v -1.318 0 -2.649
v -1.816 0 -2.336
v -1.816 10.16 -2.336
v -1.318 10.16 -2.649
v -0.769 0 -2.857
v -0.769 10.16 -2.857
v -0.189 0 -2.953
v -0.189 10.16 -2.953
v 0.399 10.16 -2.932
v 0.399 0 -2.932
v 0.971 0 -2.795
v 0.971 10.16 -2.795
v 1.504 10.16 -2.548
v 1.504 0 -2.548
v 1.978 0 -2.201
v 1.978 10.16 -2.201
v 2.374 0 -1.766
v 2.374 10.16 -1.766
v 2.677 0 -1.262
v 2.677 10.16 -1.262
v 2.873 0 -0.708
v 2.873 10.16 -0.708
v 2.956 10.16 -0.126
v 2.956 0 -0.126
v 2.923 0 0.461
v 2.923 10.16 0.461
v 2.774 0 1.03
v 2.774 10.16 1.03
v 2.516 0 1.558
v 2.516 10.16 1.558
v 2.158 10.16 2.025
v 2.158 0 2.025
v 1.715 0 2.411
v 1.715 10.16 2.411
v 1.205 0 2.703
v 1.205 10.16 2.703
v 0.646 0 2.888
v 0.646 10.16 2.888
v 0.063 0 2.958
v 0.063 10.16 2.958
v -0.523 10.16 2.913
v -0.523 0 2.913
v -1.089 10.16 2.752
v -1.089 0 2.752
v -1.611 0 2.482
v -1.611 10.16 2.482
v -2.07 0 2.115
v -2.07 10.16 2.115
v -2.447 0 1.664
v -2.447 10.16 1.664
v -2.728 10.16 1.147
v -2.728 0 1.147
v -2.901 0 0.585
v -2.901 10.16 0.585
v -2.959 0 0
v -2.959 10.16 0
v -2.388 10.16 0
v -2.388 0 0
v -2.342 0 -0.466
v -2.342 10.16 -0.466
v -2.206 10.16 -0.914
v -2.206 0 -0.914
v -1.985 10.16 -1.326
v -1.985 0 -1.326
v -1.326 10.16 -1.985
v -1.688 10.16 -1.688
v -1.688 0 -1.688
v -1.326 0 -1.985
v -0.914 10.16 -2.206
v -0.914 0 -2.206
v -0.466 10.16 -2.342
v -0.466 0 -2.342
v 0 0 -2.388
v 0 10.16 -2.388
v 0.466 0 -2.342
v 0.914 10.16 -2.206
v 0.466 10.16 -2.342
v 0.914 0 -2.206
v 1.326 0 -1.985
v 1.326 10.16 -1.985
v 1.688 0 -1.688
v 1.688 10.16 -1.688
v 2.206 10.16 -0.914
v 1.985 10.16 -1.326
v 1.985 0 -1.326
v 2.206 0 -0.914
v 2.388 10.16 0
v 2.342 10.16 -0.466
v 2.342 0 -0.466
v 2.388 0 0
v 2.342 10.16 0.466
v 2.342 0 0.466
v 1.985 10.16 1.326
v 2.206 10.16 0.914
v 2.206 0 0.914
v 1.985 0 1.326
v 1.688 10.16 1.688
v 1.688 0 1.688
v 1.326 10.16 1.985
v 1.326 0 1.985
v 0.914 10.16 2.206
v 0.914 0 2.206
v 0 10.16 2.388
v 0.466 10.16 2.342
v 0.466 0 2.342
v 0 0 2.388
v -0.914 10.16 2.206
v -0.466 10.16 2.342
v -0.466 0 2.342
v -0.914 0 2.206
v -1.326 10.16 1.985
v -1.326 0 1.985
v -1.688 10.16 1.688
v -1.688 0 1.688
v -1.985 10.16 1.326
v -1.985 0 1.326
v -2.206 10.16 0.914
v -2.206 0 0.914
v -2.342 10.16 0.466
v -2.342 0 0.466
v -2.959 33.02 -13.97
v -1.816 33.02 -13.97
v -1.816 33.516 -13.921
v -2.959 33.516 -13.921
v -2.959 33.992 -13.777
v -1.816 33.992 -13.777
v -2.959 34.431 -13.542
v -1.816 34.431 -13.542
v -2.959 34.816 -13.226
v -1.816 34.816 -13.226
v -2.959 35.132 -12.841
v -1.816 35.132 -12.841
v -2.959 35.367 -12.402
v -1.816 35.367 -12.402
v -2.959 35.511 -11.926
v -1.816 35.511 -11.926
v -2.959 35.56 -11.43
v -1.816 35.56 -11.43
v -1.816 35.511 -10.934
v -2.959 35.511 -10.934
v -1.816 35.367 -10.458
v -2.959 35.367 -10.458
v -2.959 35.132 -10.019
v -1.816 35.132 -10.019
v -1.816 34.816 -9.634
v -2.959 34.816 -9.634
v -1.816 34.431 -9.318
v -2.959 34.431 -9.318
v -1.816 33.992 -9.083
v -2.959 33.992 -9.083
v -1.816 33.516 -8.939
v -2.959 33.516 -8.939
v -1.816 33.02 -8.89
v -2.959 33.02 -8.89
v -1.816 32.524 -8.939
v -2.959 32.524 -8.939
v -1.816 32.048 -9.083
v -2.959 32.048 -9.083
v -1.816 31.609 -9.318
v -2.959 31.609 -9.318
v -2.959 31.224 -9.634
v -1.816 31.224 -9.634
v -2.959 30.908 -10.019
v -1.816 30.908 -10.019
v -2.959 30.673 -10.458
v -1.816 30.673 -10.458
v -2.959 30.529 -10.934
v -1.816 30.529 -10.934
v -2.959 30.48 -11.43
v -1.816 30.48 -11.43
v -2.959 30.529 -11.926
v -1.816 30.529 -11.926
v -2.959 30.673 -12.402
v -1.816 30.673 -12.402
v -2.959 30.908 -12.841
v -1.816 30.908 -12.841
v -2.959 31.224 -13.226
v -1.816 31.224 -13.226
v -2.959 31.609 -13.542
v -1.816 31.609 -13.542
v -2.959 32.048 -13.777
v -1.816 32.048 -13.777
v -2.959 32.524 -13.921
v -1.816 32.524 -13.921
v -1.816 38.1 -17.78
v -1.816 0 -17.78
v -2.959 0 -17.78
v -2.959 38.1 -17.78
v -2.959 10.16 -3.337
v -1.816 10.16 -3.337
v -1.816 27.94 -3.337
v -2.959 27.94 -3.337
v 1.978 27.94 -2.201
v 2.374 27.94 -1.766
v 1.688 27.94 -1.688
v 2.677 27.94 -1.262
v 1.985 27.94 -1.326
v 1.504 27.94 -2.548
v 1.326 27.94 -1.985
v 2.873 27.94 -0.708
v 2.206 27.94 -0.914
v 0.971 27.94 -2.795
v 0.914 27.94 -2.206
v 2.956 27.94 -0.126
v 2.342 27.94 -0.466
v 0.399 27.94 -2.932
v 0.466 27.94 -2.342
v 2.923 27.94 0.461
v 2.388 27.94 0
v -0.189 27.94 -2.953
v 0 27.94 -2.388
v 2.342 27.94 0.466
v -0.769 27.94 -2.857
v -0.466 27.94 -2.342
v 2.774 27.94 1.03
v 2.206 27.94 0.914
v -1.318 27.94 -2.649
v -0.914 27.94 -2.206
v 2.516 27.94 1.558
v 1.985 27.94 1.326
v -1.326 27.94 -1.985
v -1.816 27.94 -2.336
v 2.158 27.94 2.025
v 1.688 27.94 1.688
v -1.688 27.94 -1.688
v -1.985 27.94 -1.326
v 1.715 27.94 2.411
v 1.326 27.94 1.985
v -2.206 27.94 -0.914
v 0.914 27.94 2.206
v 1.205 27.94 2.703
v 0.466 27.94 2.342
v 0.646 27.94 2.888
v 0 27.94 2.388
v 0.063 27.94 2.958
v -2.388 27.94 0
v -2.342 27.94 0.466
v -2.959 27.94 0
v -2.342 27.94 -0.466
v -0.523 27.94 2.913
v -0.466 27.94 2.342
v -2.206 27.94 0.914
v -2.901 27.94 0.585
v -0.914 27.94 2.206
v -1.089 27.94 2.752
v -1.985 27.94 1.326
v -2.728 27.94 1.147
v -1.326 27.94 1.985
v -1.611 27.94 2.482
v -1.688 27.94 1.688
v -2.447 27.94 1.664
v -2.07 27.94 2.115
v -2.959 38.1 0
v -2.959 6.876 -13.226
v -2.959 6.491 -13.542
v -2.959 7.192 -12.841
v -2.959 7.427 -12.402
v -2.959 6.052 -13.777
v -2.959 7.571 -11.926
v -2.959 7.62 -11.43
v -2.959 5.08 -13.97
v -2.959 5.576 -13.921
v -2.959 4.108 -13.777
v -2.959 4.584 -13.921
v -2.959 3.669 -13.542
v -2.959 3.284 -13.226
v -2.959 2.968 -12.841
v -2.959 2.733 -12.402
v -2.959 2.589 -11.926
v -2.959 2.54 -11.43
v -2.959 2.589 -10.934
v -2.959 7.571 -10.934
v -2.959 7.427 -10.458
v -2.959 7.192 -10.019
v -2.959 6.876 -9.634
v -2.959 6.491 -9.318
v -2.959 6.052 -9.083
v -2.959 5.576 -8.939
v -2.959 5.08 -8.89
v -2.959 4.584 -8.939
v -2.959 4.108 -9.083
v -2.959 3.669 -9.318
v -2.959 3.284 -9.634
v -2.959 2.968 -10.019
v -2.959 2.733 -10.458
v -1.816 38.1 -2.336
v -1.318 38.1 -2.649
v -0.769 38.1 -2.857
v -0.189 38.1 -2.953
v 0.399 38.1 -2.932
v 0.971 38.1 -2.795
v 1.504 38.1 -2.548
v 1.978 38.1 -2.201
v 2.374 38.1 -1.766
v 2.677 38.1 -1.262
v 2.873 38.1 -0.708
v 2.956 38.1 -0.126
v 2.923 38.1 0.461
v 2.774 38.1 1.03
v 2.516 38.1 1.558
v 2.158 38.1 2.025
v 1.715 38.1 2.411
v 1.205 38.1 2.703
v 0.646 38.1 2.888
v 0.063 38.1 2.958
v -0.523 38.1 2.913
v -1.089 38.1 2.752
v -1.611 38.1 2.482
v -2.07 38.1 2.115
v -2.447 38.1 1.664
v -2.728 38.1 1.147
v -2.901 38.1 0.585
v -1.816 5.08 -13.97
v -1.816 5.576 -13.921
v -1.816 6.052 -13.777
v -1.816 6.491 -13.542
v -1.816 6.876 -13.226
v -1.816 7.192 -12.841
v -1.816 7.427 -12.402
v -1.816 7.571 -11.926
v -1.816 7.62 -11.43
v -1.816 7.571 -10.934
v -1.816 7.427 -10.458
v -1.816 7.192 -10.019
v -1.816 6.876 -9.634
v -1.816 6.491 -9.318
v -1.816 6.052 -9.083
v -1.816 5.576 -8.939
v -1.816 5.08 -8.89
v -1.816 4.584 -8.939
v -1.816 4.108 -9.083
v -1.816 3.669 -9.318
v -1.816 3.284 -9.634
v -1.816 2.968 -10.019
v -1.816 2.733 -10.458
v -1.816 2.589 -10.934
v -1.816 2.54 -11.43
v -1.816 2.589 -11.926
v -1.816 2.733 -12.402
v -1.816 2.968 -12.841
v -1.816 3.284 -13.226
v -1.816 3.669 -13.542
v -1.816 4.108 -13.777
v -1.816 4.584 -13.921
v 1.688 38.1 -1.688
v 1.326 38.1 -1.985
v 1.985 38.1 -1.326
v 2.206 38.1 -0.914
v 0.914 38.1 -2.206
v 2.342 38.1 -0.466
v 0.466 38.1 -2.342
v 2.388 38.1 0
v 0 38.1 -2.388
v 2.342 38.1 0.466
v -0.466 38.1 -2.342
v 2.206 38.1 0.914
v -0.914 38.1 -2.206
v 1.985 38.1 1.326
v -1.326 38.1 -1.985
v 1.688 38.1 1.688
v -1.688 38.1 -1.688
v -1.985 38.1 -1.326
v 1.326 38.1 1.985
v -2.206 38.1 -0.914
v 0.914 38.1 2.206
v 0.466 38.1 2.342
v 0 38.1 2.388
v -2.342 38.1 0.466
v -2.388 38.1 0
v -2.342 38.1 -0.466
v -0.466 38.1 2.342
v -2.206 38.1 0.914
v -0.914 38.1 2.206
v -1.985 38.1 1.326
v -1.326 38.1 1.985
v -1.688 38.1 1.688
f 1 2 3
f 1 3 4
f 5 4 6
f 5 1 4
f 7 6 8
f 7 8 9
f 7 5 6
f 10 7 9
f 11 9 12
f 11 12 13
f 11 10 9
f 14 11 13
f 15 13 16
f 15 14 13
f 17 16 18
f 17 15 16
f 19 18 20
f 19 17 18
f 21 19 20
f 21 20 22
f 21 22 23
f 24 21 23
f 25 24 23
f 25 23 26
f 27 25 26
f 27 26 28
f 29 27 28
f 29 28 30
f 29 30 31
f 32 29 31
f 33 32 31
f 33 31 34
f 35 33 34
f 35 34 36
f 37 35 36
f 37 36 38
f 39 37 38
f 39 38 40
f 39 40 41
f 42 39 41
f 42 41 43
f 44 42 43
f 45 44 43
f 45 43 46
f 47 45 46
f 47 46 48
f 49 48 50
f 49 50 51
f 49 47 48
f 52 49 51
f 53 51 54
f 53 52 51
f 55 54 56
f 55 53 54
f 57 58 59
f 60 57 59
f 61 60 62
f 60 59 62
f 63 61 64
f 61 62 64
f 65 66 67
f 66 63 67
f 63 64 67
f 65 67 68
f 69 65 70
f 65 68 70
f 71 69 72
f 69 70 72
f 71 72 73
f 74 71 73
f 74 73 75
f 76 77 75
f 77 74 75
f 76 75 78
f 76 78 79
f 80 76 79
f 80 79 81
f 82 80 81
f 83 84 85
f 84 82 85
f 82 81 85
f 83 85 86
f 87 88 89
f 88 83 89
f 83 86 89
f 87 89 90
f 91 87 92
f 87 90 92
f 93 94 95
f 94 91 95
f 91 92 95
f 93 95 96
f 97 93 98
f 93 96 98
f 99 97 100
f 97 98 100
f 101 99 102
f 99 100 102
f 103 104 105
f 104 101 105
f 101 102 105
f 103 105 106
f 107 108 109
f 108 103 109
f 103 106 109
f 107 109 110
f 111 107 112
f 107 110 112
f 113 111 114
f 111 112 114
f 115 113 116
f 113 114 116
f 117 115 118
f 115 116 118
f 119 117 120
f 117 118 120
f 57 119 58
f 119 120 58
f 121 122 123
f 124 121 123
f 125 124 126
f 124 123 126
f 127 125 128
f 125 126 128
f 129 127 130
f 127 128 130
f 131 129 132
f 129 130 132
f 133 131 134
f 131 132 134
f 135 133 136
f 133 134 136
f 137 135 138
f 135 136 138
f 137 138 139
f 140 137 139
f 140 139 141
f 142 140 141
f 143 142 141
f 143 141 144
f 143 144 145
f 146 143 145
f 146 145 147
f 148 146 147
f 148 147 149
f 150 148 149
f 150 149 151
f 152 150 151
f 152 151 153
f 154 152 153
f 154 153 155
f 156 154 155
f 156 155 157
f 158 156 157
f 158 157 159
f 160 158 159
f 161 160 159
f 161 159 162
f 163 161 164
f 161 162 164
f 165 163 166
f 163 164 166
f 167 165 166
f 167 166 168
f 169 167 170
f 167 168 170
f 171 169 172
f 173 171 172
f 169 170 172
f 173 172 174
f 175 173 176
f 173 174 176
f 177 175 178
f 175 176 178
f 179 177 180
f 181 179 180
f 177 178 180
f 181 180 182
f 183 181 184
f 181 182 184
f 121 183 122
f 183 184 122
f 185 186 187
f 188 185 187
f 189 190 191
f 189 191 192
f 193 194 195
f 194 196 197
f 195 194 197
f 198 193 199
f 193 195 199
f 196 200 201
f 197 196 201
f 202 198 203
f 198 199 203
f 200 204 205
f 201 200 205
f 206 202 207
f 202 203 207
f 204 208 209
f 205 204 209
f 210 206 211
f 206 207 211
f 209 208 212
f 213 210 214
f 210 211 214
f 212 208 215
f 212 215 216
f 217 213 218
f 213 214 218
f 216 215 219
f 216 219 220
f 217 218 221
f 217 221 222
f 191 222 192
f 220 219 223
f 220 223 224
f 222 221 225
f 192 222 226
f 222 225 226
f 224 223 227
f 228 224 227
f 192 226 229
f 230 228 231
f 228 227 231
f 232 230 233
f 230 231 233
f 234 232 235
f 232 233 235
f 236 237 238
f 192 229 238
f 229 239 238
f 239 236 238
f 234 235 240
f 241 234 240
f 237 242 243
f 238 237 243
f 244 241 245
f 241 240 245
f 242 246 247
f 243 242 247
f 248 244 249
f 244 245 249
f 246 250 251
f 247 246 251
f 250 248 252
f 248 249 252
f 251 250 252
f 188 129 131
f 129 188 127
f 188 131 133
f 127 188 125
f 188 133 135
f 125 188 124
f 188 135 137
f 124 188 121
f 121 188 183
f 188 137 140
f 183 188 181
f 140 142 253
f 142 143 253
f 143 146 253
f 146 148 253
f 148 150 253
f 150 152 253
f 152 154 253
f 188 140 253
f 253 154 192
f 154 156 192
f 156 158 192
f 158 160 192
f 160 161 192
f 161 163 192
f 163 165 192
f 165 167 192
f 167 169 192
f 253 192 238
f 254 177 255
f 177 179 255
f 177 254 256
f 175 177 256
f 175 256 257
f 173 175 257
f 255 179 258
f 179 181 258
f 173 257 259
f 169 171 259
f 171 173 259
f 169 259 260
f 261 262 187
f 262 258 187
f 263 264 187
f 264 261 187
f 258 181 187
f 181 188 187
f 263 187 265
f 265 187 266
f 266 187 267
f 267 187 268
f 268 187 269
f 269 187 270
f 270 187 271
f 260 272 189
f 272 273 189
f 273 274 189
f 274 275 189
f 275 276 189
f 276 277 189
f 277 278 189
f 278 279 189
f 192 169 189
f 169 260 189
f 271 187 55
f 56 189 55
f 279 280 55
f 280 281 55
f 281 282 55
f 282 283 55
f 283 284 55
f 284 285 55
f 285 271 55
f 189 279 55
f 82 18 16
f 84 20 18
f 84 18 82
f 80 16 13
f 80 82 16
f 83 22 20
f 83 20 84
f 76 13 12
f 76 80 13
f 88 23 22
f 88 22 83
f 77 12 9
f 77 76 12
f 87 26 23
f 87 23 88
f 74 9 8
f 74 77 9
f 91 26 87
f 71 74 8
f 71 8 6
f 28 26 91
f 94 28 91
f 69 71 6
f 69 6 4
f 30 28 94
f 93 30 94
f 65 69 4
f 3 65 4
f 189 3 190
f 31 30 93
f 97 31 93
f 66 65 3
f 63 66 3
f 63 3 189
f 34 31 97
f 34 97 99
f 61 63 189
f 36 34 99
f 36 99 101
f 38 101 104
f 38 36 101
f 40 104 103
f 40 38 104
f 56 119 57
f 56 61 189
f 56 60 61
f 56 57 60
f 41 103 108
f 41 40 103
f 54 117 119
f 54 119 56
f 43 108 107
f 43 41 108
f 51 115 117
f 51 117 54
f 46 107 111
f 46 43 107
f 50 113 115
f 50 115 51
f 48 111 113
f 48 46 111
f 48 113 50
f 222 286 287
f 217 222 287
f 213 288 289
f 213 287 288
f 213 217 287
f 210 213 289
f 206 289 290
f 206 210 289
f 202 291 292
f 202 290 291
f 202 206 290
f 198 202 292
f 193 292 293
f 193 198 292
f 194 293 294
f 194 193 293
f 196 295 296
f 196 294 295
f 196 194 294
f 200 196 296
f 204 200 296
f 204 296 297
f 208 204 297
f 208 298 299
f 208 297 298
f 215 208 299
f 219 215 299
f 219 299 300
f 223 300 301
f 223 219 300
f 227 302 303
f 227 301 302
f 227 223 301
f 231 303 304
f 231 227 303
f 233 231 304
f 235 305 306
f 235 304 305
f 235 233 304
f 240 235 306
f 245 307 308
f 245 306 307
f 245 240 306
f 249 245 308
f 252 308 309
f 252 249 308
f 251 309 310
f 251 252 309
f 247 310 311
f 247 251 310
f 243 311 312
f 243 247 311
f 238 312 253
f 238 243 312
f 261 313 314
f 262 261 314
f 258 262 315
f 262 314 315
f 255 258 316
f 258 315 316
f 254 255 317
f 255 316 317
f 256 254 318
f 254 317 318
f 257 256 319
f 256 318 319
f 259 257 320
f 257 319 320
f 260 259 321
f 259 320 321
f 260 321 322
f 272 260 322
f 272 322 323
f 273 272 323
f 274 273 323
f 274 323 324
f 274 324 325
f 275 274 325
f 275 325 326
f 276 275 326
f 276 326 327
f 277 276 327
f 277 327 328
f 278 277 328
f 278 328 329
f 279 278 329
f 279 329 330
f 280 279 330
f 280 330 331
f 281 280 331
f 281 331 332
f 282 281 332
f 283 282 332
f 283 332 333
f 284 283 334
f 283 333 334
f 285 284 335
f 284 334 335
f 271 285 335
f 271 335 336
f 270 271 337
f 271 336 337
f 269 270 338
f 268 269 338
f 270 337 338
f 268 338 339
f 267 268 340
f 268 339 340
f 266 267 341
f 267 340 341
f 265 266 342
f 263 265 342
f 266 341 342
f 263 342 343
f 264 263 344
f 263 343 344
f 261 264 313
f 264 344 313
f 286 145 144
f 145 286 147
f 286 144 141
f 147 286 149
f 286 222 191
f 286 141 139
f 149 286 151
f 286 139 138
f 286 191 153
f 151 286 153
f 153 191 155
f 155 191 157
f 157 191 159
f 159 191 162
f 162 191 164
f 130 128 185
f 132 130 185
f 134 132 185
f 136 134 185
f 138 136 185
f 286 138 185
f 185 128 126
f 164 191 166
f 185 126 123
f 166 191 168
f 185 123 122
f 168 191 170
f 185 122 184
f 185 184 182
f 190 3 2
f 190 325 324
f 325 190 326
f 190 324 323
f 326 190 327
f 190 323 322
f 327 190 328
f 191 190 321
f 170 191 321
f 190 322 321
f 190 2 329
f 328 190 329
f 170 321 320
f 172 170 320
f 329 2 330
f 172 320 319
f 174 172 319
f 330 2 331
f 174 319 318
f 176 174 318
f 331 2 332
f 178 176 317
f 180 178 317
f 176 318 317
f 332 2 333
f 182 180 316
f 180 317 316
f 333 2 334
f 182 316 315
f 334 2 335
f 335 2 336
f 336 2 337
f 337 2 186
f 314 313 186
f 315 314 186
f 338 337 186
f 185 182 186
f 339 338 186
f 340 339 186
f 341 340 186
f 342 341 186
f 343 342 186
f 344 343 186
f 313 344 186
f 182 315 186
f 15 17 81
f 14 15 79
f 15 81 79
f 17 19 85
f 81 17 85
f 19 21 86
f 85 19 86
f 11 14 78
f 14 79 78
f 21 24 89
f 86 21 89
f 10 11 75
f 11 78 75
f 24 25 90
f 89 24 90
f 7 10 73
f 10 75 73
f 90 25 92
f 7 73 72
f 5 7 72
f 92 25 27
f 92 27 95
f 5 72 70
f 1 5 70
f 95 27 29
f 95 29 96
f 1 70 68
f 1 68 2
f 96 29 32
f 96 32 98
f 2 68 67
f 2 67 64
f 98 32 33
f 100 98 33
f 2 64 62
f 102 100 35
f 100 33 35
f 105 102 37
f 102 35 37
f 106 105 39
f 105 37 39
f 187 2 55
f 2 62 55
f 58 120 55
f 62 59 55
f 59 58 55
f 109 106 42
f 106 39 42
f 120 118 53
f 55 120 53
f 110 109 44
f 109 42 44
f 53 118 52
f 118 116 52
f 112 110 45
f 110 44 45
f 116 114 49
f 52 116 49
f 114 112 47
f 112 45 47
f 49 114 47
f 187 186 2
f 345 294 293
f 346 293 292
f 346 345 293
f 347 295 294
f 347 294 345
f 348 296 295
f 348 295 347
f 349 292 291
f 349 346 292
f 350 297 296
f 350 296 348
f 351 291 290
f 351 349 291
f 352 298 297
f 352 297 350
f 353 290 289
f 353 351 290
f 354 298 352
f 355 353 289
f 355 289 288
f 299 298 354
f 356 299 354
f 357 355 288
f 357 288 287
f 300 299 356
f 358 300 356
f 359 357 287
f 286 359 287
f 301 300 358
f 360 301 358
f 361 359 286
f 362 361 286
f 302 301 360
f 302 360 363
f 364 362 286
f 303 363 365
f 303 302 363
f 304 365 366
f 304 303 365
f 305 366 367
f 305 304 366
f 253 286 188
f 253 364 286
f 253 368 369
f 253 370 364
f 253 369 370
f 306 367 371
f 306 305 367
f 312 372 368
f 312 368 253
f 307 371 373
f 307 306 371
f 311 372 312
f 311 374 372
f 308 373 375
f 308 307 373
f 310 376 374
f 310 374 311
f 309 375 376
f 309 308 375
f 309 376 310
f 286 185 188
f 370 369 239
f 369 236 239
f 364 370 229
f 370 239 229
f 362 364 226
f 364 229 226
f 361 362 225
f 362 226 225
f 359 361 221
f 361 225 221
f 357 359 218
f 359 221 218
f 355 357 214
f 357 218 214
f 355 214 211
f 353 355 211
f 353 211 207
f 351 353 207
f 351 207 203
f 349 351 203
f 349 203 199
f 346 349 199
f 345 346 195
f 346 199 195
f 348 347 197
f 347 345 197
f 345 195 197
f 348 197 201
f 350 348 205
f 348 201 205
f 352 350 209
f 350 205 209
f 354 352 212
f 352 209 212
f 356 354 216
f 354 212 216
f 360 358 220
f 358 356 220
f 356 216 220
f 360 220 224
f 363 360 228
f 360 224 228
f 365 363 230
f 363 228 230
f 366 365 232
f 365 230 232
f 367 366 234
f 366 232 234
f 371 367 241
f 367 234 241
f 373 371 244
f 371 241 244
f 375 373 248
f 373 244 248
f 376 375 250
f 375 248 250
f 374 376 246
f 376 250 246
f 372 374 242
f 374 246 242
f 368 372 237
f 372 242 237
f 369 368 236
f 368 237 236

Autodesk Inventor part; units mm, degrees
ref_plane "YZ Plane" through (0, 0, 0) normal (1, 0, 0) x (0, 1, 0)
ref_plane "XY Plane" through (0, 0, 0) normal (0, 0, 1) x (1, 0, 0)
sketch "Sketch1" plane through (0, 0, 0) normal (0, 1, 0) x (-1, 0, 0)
  circle A0 centre (0, 0) radius 2.3876
  arc A1 (2.9591, 0) -> (1.8161, -2.3362) centre (0, 0) ccw
  line L0 (2.9591, 0) -> (2.3876, 0)
  line L1 (1.8161, -2.3362) -> (1.8161, -17.78)
  line L2 (1.8161, -17.78) -> (2.9591, -17.78)
  line L3 (2.9591, -17.78) -> (2.9591, 0)
  dimension "d0" = 4.7752
  dimension "d1" = 5.9182
  dimension "d2" = 17.78
  dimension "d3" = 1.143
extrude "Extrusion1" add sketch "Sketch1" along normal blind 38.1
ref_plane "Work Plane1" through (0, 10.16, 0) normal (0, 1, 0) x (-1, 0, 0)
sketch "Sketch2" plane through (0, 10.16, 0) normal (0, 1, 0) x (-1, 0, 0)
  circle A0 centre (0, 0) radius 2.3876 projected
  arc A1 (2.9591, 0) -> (1.8161, -2.3362) centre (0, 0) ccw projected
  line L0 (1.8161, -2.3362) -> (1.8161, -17.78) projected
  line L1 (1.8161, -17.78) -> (2.9591, -17.78) projected
  line L2 (2.9591, -17.78) -> (2.9591, 0) projected
  line L3 (2.9591, 3.4646) -> (-3.1409, 3.4646)
  line L4 (-3.1409, 3.4646) -> (-3.1409, -3.337)
  line L5 (-3.1409, -3.337) -> (2.9591, -3.337)
  line L6 (2.9591, -3.337) -> (2.9591, 3.4646)
  dimension "d7" = 0
  dimension "d8" = 6.1
  dimension "d9" = 21.2446
  dimension "d10" = 14.443
extrude "Extrusion2" cut sketch "Sketch2" along normal blind 17.78 contours L2 L5 L0 A1 | A1 L0 L5 L4 L3 L6
sketch "Sketch3" plane through (-1.8161, 0, -2.3362) normal (1, 0, 0) x (0, 0, -1)
  circle A0 centre (9.0938, 5.08) radius 2.54
  circle A1 centre (9.0938, 33.02) radius 2.54
  line L0 (15.4438, 0) -> (15.4438, 38.1) projected
  line L1 (0, 0) -> (15.4438, 0) projected
  line L2 (0, 38.1) -> (15.4438, 38.1) projected
  point P0 (-2.3362, 0)
  dimension "d13" = 6.35
  dimension "d14" = 5.08
  dimension "d15" = 5.08
  dimension "d17" = 5.08
extrude "Extrusion3" cut sketch "Sketch3" against normal up to next
equation "\"d17\" = d14"
properties part number "Hinge Wall 1"
